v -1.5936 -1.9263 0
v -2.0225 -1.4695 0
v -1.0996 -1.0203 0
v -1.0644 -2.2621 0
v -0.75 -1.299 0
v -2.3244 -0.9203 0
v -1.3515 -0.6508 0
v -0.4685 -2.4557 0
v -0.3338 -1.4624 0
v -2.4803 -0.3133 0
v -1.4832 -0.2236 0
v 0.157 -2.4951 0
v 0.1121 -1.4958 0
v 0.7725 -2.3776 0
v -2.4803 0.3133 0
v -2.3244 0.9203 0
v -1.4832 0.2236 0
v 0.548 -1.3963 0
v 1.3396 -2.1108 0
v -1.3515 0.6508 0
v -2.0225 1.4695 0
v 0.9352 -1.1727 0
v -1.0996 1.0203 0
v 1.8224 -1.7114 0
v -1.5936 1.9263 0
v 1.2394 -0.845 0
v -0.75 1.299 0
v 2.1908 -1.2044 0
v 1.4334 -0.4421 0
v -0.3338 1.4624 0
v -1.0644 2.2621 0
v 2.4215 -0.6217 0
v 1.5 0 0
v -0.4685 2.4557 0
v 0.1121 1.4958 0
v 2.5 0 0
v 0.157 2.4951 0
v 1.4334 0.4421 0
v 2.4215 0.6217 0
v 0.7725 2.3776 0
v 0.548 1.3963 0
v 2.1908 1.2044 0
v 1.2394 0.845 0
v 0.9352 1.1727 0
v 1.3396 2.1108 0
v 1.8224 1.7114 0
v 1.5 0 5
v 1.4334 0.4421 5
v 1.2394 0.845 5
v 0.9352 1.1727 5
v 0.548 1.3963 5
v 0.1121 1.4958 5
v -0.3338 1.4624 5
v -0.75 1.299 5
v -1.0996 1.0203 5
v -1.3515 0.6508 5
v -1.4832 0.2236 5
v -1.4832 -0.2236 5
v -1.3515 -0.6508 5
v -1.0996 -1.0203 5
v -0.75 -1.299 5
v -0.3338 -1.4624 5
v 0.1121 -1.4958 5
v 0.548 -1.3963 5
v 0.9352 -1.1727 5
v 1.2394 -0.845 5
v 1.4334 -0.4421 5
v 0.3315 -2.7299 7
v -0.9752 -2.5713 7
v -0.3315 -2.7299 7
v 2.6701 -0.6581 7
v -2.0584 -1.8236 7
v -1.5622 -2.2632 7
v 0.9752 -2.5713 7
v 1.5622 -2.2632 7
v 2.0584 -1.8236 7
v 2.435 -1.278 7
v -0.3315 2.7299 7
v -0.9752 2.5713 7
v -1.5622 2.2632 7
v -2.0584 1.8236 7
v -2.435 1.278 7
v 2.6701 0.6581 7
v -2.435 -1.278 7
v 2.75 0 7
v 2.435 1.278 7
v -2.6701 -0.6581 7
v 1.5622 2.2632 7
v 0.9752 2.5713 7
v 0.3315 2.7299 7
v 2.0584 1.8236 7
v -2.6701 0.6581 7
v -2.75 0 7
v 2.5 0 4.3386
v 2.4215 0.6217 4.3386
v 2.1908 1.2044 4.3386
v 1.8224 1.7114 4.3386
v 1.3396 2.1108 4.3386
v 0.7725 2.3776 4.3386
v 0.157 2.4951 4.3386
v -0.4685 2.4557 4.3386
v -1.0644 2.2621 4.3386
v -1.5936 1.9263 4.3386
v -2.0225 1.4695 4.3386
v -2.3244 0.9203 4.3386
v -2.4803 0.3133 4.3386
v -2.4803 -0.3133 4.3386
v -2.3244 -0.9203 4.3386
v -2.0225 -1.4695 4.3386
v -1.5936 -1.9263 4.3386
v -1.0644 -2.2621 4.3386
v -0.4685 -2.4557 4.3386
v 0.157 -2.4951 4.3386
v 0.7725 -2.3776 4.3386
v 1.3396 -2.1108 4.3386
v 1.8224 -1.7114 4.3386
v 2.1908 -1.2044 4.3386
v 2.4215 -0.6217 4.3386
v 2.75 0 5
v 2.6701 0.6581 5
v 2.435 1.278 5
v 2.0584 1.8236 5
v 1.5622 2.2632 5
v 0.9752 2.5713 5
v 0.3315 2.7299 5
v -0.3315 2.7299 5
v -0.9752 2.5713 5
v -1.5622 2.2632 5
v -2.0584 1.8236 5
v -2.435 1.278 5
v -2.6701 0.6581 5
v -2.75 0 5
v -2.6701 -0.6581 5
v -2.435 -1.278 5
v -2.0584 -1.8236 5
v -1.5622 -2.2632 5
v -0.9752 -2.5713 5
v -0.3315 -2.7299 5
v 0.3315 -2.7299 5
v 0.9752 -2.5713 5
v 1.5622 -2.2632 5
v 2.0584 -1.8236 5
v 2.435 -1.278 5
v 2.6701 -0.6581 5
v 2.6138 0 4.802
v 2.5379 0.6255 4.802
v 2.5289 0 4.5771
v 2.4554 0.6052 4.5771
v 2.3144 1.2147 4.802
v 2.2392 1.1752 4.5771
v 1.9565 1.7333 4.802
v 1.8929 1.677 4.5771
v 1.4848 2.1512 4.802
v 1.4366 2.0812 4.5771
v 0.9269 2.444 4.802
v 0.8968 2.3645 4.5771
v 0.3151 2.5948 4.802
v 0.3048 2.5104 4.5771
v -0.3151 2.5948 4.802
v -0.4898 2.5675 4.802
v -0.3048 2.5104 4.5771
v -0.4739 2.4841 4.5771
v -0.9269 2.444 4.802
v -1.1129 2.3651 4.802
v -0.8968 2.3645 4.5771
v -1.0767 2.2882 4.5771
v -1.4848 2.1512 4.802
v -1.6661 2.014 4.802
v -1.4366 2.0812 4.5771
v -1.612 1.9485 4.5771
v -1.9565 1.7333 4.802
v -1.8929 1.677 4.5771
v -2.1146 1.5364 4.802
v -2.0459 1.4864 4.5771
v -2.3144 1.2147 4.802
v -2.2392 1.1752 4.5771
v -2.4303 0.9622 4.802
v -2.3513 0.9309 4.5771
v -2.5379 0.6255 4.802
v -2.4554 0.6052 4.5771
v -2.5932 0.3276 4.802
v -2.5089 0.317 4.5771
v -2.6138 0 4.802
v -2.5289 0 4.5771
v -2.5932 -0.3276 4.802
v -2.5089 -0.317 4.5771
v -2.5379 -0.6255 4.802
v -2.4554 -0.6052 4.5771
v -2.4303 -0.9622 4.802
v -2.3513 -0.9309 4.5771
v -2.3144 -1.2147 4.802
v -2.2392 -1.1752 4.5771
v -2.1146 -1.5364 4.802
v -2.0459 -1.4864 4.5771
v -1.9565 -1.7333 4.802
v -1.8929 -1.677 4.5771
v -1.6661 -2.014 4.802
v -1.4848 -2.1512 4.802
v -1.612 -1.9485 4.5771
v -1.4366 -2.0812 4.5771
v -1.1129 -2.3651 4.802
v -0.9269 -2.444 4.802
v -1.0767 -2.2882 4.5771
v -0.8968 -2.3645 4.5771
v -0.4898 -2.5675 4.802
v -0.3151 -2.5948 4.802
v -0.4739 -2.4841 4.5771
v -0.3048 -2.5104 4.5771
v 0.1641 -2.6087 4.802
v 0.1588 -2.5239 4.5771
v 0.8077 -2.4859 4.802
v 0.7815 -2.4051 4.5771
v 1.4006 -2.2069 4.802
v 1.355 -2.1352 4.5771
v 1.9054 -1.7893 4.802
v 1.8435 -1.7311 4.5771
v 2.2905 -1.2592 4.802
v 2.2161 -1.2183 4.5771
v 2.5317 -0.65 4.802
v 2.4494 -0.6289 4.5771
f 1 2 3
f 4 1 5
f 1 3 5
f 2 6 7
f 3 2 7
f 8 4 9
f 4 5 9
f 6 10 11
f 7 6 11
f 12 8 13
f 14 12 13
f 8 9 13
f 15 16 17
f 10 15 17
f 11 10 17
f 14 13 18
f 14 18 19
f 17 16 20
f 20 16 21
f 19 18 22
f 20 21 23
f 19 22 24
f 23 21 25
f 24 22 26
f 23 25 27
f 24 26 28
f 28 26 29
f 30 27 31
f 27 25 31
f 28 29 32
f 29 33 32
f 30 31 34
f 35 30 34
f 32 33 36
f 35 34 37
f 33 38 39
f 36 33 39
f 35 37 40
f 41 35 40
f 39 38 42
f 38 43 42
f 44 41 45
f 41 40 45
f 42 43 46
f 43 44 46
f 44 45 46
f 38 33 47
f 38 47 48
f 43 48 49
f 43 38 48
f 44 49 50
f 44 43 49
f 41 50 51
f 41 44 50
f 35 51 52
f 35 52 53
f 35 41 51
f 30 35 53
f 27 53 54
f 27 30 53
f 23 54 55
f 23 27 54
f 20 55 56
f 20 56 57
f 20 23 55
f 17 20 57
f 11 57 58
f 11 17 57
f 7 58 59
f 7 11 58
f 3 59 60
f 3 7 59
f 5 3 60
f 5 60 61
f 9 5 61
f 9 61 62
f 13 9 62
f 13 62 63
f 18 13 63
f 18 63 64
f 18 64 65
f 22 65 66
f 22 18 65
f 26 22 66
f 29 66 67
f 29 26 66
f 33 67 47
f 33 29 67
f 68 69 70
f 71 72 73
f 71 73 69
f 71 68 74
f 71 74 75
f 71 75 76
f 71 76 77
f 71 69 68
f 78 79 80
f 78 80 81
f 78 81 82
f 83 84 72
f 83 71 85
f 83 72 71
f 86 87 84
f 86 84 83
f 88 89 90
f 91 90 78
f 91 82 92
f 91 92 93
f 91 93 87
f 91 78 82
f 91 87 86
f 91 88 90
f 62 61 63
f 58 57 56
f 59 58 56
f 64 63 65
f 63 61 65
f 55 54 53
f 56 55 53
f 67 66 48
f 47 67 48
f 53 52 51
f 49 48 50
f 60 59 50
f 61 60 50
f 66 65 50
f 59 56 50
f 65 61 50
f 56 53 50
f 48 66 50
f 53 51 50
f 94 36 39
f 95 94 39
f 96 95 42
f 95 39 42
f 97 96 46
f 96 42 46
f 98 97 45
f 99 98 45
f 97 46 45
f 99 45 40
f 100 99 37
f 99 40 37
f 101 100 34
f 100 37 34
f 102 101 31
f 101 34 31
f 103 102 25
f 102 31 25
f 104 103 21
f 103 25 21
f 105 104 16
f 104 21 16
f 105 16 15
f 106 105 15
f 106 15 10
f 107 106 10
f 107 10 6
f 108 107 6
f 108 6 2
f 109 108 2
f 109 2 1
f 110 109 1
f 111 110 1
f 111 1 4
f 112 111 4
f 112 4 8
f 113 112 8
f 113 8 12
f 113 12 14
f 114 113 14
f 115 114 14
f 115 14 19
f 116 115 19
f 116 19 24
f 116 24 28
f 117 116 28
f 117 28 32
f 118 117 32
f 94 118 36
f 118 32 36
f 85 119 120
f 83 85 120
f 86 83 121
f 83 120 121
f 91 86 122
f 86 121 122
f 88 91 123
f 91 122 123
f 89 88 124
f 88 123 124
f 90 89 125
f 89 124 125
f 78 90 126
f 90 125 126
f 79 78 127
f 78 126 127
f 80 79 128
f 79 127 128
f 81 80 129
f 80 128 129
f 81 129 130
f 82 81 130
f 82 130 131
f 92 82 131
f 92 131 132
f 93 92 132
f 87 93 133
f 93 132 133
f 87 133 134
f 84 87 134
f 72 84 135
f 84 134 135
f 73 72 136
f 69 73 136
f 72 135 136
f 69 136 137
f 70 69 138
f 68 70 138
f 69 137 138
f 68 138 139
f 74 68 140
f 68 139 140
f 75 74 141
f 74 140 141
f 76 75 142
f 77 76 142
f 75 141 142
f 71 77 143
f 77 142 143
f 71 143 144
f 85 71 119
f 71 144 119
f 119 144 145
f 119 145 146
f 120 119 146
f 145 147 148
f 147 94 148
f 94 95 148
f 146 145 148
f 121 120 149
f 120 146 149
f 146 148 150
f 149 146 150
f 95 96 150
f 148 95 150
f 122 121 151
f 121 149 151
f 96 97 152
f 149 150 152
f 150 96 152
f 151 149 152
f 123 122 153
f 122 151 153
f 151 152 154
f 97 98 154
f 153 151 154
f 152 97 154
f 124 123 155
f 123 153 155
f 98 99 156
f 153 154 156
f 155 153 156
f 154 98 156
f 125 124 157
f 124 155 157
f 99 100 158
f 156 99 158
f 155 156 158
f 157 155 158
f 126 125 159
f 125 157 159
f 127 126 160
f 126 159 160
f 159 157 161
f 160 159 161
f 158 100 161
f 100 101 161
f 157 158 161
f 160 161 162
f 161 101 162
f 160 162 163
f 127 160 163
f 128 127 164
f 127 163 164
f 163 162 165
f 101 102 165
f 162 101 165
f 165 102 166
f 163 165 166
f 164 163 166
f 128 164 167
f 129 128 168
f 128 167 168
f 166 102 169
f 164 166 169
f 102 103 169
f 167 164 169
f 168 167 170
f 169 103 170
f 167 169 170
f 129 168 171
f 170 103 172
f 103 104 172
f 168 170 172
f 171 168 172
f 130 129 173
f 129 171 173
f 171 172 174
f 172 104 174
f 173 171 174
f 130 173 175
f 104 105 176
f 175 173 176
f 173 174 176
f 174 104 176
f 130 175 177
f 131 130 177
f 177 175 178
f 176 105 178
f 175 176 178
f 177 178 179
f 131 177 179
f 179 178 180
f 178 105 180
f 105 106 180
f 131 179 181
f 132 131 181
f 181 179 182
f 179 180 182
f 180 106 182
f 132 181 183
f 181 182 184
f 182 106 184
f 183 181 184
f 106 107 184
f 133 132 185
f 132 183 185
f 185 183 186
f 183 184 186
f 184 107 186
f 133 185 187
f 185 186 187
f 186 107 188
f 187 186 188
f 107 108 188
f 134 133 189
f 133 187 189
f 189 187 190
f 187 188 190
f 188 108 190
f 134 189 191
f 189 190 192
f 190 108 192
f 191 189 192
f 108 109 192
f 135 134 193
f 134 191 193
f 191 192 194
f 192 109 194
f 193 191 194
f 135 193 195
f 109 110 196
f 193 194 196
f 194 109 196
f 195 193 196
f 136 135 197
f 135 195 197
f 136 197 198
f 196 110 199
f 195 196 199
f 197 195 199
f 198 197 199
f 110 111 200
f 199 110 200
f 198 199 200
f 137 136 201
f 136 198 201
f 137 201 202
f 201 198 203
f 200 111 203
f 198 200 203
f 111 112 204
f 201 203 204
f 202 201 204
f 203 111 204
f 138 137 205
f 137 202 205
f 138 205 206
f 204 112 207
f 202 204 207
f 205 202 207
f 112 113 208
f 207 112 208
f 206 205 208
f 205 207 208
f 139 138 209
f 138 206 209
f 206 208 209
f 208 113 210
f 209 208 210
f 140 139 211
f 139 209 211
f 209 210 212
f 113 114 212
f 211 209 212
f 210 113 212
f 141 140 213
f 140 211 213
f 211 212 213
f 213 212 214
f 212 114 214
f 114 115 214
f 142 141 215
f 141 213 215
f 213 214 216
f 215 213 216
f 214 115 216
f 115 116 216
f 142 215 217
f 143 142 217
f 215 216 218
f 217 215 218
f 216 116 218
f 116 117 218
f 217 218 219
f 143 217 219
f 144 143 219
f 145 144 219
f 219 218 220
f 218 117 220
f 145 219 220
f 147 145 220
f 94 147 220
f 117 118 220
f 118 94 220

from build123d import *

# Parameters (mm, degrees)
SCHIZZO1_R                   = 2.5
SCHIZZO1_R_2                 = 1.5
ESTRUSIONE_ESTRUSIONE1_DEPTH = 5
SCHIZZO2_R                   = 2.75
ESTRUSIONE_ESTRUSIONE2_DEPTH = 2
RACCORDO1_R                  = 1


with BuildPart() as part:
    # Schizzo1 → Estrusione-Estrusione1 (new body)
    with BuildSketch(Plane.XY):
        Circle(SCHIZZO1_R)
        Circle(SCHIZZO1_R_2, mode=Mode.SUBTRACT)
    extrude(amount=ESTRUSIONE_ESTRUSIONE1_DEPTH)

    # Schizzo2 → Estrusione-Estrusione2 (add)
    with BuildSketch(Plane.XY.offset(5)):
        Circle(SCHIZZO2_R)
    extrude(amount=ESTRUSIONE_ESTRUSIONE2_DEPTH)

    # Raccordo1
    # the kernel refuses this fillet: 1 mm, written as the material it adds along each edge
    with BuildSketch(Plane(origin=(0, 0, 5), x_dir=(1, 0, 0), z_dir=(0, -1, 0))) as raccordo1_piece_1:
        with BuildLine():
            CenterArc((3.5, -0.661437828), RACCORDO1_R, 138.590377891, 41.409622109)
            Line((2.5, -0.661437828), (2.48, -0.661437828))
            Line((2.48, -0.661437828), (2.48, 0))
            Line((2.48, 0), (2.5, 0.02))
            ThreePointArc((2.5, 0.02), (2.625, 0.02), (2.735, 0.013228757))
            Line((2.735, 0.013228757), (2.75, 0))
        make_face()
    revolve(axis=Axis((0, 0, 5), (0, 0, 1)))


solid = part.part
